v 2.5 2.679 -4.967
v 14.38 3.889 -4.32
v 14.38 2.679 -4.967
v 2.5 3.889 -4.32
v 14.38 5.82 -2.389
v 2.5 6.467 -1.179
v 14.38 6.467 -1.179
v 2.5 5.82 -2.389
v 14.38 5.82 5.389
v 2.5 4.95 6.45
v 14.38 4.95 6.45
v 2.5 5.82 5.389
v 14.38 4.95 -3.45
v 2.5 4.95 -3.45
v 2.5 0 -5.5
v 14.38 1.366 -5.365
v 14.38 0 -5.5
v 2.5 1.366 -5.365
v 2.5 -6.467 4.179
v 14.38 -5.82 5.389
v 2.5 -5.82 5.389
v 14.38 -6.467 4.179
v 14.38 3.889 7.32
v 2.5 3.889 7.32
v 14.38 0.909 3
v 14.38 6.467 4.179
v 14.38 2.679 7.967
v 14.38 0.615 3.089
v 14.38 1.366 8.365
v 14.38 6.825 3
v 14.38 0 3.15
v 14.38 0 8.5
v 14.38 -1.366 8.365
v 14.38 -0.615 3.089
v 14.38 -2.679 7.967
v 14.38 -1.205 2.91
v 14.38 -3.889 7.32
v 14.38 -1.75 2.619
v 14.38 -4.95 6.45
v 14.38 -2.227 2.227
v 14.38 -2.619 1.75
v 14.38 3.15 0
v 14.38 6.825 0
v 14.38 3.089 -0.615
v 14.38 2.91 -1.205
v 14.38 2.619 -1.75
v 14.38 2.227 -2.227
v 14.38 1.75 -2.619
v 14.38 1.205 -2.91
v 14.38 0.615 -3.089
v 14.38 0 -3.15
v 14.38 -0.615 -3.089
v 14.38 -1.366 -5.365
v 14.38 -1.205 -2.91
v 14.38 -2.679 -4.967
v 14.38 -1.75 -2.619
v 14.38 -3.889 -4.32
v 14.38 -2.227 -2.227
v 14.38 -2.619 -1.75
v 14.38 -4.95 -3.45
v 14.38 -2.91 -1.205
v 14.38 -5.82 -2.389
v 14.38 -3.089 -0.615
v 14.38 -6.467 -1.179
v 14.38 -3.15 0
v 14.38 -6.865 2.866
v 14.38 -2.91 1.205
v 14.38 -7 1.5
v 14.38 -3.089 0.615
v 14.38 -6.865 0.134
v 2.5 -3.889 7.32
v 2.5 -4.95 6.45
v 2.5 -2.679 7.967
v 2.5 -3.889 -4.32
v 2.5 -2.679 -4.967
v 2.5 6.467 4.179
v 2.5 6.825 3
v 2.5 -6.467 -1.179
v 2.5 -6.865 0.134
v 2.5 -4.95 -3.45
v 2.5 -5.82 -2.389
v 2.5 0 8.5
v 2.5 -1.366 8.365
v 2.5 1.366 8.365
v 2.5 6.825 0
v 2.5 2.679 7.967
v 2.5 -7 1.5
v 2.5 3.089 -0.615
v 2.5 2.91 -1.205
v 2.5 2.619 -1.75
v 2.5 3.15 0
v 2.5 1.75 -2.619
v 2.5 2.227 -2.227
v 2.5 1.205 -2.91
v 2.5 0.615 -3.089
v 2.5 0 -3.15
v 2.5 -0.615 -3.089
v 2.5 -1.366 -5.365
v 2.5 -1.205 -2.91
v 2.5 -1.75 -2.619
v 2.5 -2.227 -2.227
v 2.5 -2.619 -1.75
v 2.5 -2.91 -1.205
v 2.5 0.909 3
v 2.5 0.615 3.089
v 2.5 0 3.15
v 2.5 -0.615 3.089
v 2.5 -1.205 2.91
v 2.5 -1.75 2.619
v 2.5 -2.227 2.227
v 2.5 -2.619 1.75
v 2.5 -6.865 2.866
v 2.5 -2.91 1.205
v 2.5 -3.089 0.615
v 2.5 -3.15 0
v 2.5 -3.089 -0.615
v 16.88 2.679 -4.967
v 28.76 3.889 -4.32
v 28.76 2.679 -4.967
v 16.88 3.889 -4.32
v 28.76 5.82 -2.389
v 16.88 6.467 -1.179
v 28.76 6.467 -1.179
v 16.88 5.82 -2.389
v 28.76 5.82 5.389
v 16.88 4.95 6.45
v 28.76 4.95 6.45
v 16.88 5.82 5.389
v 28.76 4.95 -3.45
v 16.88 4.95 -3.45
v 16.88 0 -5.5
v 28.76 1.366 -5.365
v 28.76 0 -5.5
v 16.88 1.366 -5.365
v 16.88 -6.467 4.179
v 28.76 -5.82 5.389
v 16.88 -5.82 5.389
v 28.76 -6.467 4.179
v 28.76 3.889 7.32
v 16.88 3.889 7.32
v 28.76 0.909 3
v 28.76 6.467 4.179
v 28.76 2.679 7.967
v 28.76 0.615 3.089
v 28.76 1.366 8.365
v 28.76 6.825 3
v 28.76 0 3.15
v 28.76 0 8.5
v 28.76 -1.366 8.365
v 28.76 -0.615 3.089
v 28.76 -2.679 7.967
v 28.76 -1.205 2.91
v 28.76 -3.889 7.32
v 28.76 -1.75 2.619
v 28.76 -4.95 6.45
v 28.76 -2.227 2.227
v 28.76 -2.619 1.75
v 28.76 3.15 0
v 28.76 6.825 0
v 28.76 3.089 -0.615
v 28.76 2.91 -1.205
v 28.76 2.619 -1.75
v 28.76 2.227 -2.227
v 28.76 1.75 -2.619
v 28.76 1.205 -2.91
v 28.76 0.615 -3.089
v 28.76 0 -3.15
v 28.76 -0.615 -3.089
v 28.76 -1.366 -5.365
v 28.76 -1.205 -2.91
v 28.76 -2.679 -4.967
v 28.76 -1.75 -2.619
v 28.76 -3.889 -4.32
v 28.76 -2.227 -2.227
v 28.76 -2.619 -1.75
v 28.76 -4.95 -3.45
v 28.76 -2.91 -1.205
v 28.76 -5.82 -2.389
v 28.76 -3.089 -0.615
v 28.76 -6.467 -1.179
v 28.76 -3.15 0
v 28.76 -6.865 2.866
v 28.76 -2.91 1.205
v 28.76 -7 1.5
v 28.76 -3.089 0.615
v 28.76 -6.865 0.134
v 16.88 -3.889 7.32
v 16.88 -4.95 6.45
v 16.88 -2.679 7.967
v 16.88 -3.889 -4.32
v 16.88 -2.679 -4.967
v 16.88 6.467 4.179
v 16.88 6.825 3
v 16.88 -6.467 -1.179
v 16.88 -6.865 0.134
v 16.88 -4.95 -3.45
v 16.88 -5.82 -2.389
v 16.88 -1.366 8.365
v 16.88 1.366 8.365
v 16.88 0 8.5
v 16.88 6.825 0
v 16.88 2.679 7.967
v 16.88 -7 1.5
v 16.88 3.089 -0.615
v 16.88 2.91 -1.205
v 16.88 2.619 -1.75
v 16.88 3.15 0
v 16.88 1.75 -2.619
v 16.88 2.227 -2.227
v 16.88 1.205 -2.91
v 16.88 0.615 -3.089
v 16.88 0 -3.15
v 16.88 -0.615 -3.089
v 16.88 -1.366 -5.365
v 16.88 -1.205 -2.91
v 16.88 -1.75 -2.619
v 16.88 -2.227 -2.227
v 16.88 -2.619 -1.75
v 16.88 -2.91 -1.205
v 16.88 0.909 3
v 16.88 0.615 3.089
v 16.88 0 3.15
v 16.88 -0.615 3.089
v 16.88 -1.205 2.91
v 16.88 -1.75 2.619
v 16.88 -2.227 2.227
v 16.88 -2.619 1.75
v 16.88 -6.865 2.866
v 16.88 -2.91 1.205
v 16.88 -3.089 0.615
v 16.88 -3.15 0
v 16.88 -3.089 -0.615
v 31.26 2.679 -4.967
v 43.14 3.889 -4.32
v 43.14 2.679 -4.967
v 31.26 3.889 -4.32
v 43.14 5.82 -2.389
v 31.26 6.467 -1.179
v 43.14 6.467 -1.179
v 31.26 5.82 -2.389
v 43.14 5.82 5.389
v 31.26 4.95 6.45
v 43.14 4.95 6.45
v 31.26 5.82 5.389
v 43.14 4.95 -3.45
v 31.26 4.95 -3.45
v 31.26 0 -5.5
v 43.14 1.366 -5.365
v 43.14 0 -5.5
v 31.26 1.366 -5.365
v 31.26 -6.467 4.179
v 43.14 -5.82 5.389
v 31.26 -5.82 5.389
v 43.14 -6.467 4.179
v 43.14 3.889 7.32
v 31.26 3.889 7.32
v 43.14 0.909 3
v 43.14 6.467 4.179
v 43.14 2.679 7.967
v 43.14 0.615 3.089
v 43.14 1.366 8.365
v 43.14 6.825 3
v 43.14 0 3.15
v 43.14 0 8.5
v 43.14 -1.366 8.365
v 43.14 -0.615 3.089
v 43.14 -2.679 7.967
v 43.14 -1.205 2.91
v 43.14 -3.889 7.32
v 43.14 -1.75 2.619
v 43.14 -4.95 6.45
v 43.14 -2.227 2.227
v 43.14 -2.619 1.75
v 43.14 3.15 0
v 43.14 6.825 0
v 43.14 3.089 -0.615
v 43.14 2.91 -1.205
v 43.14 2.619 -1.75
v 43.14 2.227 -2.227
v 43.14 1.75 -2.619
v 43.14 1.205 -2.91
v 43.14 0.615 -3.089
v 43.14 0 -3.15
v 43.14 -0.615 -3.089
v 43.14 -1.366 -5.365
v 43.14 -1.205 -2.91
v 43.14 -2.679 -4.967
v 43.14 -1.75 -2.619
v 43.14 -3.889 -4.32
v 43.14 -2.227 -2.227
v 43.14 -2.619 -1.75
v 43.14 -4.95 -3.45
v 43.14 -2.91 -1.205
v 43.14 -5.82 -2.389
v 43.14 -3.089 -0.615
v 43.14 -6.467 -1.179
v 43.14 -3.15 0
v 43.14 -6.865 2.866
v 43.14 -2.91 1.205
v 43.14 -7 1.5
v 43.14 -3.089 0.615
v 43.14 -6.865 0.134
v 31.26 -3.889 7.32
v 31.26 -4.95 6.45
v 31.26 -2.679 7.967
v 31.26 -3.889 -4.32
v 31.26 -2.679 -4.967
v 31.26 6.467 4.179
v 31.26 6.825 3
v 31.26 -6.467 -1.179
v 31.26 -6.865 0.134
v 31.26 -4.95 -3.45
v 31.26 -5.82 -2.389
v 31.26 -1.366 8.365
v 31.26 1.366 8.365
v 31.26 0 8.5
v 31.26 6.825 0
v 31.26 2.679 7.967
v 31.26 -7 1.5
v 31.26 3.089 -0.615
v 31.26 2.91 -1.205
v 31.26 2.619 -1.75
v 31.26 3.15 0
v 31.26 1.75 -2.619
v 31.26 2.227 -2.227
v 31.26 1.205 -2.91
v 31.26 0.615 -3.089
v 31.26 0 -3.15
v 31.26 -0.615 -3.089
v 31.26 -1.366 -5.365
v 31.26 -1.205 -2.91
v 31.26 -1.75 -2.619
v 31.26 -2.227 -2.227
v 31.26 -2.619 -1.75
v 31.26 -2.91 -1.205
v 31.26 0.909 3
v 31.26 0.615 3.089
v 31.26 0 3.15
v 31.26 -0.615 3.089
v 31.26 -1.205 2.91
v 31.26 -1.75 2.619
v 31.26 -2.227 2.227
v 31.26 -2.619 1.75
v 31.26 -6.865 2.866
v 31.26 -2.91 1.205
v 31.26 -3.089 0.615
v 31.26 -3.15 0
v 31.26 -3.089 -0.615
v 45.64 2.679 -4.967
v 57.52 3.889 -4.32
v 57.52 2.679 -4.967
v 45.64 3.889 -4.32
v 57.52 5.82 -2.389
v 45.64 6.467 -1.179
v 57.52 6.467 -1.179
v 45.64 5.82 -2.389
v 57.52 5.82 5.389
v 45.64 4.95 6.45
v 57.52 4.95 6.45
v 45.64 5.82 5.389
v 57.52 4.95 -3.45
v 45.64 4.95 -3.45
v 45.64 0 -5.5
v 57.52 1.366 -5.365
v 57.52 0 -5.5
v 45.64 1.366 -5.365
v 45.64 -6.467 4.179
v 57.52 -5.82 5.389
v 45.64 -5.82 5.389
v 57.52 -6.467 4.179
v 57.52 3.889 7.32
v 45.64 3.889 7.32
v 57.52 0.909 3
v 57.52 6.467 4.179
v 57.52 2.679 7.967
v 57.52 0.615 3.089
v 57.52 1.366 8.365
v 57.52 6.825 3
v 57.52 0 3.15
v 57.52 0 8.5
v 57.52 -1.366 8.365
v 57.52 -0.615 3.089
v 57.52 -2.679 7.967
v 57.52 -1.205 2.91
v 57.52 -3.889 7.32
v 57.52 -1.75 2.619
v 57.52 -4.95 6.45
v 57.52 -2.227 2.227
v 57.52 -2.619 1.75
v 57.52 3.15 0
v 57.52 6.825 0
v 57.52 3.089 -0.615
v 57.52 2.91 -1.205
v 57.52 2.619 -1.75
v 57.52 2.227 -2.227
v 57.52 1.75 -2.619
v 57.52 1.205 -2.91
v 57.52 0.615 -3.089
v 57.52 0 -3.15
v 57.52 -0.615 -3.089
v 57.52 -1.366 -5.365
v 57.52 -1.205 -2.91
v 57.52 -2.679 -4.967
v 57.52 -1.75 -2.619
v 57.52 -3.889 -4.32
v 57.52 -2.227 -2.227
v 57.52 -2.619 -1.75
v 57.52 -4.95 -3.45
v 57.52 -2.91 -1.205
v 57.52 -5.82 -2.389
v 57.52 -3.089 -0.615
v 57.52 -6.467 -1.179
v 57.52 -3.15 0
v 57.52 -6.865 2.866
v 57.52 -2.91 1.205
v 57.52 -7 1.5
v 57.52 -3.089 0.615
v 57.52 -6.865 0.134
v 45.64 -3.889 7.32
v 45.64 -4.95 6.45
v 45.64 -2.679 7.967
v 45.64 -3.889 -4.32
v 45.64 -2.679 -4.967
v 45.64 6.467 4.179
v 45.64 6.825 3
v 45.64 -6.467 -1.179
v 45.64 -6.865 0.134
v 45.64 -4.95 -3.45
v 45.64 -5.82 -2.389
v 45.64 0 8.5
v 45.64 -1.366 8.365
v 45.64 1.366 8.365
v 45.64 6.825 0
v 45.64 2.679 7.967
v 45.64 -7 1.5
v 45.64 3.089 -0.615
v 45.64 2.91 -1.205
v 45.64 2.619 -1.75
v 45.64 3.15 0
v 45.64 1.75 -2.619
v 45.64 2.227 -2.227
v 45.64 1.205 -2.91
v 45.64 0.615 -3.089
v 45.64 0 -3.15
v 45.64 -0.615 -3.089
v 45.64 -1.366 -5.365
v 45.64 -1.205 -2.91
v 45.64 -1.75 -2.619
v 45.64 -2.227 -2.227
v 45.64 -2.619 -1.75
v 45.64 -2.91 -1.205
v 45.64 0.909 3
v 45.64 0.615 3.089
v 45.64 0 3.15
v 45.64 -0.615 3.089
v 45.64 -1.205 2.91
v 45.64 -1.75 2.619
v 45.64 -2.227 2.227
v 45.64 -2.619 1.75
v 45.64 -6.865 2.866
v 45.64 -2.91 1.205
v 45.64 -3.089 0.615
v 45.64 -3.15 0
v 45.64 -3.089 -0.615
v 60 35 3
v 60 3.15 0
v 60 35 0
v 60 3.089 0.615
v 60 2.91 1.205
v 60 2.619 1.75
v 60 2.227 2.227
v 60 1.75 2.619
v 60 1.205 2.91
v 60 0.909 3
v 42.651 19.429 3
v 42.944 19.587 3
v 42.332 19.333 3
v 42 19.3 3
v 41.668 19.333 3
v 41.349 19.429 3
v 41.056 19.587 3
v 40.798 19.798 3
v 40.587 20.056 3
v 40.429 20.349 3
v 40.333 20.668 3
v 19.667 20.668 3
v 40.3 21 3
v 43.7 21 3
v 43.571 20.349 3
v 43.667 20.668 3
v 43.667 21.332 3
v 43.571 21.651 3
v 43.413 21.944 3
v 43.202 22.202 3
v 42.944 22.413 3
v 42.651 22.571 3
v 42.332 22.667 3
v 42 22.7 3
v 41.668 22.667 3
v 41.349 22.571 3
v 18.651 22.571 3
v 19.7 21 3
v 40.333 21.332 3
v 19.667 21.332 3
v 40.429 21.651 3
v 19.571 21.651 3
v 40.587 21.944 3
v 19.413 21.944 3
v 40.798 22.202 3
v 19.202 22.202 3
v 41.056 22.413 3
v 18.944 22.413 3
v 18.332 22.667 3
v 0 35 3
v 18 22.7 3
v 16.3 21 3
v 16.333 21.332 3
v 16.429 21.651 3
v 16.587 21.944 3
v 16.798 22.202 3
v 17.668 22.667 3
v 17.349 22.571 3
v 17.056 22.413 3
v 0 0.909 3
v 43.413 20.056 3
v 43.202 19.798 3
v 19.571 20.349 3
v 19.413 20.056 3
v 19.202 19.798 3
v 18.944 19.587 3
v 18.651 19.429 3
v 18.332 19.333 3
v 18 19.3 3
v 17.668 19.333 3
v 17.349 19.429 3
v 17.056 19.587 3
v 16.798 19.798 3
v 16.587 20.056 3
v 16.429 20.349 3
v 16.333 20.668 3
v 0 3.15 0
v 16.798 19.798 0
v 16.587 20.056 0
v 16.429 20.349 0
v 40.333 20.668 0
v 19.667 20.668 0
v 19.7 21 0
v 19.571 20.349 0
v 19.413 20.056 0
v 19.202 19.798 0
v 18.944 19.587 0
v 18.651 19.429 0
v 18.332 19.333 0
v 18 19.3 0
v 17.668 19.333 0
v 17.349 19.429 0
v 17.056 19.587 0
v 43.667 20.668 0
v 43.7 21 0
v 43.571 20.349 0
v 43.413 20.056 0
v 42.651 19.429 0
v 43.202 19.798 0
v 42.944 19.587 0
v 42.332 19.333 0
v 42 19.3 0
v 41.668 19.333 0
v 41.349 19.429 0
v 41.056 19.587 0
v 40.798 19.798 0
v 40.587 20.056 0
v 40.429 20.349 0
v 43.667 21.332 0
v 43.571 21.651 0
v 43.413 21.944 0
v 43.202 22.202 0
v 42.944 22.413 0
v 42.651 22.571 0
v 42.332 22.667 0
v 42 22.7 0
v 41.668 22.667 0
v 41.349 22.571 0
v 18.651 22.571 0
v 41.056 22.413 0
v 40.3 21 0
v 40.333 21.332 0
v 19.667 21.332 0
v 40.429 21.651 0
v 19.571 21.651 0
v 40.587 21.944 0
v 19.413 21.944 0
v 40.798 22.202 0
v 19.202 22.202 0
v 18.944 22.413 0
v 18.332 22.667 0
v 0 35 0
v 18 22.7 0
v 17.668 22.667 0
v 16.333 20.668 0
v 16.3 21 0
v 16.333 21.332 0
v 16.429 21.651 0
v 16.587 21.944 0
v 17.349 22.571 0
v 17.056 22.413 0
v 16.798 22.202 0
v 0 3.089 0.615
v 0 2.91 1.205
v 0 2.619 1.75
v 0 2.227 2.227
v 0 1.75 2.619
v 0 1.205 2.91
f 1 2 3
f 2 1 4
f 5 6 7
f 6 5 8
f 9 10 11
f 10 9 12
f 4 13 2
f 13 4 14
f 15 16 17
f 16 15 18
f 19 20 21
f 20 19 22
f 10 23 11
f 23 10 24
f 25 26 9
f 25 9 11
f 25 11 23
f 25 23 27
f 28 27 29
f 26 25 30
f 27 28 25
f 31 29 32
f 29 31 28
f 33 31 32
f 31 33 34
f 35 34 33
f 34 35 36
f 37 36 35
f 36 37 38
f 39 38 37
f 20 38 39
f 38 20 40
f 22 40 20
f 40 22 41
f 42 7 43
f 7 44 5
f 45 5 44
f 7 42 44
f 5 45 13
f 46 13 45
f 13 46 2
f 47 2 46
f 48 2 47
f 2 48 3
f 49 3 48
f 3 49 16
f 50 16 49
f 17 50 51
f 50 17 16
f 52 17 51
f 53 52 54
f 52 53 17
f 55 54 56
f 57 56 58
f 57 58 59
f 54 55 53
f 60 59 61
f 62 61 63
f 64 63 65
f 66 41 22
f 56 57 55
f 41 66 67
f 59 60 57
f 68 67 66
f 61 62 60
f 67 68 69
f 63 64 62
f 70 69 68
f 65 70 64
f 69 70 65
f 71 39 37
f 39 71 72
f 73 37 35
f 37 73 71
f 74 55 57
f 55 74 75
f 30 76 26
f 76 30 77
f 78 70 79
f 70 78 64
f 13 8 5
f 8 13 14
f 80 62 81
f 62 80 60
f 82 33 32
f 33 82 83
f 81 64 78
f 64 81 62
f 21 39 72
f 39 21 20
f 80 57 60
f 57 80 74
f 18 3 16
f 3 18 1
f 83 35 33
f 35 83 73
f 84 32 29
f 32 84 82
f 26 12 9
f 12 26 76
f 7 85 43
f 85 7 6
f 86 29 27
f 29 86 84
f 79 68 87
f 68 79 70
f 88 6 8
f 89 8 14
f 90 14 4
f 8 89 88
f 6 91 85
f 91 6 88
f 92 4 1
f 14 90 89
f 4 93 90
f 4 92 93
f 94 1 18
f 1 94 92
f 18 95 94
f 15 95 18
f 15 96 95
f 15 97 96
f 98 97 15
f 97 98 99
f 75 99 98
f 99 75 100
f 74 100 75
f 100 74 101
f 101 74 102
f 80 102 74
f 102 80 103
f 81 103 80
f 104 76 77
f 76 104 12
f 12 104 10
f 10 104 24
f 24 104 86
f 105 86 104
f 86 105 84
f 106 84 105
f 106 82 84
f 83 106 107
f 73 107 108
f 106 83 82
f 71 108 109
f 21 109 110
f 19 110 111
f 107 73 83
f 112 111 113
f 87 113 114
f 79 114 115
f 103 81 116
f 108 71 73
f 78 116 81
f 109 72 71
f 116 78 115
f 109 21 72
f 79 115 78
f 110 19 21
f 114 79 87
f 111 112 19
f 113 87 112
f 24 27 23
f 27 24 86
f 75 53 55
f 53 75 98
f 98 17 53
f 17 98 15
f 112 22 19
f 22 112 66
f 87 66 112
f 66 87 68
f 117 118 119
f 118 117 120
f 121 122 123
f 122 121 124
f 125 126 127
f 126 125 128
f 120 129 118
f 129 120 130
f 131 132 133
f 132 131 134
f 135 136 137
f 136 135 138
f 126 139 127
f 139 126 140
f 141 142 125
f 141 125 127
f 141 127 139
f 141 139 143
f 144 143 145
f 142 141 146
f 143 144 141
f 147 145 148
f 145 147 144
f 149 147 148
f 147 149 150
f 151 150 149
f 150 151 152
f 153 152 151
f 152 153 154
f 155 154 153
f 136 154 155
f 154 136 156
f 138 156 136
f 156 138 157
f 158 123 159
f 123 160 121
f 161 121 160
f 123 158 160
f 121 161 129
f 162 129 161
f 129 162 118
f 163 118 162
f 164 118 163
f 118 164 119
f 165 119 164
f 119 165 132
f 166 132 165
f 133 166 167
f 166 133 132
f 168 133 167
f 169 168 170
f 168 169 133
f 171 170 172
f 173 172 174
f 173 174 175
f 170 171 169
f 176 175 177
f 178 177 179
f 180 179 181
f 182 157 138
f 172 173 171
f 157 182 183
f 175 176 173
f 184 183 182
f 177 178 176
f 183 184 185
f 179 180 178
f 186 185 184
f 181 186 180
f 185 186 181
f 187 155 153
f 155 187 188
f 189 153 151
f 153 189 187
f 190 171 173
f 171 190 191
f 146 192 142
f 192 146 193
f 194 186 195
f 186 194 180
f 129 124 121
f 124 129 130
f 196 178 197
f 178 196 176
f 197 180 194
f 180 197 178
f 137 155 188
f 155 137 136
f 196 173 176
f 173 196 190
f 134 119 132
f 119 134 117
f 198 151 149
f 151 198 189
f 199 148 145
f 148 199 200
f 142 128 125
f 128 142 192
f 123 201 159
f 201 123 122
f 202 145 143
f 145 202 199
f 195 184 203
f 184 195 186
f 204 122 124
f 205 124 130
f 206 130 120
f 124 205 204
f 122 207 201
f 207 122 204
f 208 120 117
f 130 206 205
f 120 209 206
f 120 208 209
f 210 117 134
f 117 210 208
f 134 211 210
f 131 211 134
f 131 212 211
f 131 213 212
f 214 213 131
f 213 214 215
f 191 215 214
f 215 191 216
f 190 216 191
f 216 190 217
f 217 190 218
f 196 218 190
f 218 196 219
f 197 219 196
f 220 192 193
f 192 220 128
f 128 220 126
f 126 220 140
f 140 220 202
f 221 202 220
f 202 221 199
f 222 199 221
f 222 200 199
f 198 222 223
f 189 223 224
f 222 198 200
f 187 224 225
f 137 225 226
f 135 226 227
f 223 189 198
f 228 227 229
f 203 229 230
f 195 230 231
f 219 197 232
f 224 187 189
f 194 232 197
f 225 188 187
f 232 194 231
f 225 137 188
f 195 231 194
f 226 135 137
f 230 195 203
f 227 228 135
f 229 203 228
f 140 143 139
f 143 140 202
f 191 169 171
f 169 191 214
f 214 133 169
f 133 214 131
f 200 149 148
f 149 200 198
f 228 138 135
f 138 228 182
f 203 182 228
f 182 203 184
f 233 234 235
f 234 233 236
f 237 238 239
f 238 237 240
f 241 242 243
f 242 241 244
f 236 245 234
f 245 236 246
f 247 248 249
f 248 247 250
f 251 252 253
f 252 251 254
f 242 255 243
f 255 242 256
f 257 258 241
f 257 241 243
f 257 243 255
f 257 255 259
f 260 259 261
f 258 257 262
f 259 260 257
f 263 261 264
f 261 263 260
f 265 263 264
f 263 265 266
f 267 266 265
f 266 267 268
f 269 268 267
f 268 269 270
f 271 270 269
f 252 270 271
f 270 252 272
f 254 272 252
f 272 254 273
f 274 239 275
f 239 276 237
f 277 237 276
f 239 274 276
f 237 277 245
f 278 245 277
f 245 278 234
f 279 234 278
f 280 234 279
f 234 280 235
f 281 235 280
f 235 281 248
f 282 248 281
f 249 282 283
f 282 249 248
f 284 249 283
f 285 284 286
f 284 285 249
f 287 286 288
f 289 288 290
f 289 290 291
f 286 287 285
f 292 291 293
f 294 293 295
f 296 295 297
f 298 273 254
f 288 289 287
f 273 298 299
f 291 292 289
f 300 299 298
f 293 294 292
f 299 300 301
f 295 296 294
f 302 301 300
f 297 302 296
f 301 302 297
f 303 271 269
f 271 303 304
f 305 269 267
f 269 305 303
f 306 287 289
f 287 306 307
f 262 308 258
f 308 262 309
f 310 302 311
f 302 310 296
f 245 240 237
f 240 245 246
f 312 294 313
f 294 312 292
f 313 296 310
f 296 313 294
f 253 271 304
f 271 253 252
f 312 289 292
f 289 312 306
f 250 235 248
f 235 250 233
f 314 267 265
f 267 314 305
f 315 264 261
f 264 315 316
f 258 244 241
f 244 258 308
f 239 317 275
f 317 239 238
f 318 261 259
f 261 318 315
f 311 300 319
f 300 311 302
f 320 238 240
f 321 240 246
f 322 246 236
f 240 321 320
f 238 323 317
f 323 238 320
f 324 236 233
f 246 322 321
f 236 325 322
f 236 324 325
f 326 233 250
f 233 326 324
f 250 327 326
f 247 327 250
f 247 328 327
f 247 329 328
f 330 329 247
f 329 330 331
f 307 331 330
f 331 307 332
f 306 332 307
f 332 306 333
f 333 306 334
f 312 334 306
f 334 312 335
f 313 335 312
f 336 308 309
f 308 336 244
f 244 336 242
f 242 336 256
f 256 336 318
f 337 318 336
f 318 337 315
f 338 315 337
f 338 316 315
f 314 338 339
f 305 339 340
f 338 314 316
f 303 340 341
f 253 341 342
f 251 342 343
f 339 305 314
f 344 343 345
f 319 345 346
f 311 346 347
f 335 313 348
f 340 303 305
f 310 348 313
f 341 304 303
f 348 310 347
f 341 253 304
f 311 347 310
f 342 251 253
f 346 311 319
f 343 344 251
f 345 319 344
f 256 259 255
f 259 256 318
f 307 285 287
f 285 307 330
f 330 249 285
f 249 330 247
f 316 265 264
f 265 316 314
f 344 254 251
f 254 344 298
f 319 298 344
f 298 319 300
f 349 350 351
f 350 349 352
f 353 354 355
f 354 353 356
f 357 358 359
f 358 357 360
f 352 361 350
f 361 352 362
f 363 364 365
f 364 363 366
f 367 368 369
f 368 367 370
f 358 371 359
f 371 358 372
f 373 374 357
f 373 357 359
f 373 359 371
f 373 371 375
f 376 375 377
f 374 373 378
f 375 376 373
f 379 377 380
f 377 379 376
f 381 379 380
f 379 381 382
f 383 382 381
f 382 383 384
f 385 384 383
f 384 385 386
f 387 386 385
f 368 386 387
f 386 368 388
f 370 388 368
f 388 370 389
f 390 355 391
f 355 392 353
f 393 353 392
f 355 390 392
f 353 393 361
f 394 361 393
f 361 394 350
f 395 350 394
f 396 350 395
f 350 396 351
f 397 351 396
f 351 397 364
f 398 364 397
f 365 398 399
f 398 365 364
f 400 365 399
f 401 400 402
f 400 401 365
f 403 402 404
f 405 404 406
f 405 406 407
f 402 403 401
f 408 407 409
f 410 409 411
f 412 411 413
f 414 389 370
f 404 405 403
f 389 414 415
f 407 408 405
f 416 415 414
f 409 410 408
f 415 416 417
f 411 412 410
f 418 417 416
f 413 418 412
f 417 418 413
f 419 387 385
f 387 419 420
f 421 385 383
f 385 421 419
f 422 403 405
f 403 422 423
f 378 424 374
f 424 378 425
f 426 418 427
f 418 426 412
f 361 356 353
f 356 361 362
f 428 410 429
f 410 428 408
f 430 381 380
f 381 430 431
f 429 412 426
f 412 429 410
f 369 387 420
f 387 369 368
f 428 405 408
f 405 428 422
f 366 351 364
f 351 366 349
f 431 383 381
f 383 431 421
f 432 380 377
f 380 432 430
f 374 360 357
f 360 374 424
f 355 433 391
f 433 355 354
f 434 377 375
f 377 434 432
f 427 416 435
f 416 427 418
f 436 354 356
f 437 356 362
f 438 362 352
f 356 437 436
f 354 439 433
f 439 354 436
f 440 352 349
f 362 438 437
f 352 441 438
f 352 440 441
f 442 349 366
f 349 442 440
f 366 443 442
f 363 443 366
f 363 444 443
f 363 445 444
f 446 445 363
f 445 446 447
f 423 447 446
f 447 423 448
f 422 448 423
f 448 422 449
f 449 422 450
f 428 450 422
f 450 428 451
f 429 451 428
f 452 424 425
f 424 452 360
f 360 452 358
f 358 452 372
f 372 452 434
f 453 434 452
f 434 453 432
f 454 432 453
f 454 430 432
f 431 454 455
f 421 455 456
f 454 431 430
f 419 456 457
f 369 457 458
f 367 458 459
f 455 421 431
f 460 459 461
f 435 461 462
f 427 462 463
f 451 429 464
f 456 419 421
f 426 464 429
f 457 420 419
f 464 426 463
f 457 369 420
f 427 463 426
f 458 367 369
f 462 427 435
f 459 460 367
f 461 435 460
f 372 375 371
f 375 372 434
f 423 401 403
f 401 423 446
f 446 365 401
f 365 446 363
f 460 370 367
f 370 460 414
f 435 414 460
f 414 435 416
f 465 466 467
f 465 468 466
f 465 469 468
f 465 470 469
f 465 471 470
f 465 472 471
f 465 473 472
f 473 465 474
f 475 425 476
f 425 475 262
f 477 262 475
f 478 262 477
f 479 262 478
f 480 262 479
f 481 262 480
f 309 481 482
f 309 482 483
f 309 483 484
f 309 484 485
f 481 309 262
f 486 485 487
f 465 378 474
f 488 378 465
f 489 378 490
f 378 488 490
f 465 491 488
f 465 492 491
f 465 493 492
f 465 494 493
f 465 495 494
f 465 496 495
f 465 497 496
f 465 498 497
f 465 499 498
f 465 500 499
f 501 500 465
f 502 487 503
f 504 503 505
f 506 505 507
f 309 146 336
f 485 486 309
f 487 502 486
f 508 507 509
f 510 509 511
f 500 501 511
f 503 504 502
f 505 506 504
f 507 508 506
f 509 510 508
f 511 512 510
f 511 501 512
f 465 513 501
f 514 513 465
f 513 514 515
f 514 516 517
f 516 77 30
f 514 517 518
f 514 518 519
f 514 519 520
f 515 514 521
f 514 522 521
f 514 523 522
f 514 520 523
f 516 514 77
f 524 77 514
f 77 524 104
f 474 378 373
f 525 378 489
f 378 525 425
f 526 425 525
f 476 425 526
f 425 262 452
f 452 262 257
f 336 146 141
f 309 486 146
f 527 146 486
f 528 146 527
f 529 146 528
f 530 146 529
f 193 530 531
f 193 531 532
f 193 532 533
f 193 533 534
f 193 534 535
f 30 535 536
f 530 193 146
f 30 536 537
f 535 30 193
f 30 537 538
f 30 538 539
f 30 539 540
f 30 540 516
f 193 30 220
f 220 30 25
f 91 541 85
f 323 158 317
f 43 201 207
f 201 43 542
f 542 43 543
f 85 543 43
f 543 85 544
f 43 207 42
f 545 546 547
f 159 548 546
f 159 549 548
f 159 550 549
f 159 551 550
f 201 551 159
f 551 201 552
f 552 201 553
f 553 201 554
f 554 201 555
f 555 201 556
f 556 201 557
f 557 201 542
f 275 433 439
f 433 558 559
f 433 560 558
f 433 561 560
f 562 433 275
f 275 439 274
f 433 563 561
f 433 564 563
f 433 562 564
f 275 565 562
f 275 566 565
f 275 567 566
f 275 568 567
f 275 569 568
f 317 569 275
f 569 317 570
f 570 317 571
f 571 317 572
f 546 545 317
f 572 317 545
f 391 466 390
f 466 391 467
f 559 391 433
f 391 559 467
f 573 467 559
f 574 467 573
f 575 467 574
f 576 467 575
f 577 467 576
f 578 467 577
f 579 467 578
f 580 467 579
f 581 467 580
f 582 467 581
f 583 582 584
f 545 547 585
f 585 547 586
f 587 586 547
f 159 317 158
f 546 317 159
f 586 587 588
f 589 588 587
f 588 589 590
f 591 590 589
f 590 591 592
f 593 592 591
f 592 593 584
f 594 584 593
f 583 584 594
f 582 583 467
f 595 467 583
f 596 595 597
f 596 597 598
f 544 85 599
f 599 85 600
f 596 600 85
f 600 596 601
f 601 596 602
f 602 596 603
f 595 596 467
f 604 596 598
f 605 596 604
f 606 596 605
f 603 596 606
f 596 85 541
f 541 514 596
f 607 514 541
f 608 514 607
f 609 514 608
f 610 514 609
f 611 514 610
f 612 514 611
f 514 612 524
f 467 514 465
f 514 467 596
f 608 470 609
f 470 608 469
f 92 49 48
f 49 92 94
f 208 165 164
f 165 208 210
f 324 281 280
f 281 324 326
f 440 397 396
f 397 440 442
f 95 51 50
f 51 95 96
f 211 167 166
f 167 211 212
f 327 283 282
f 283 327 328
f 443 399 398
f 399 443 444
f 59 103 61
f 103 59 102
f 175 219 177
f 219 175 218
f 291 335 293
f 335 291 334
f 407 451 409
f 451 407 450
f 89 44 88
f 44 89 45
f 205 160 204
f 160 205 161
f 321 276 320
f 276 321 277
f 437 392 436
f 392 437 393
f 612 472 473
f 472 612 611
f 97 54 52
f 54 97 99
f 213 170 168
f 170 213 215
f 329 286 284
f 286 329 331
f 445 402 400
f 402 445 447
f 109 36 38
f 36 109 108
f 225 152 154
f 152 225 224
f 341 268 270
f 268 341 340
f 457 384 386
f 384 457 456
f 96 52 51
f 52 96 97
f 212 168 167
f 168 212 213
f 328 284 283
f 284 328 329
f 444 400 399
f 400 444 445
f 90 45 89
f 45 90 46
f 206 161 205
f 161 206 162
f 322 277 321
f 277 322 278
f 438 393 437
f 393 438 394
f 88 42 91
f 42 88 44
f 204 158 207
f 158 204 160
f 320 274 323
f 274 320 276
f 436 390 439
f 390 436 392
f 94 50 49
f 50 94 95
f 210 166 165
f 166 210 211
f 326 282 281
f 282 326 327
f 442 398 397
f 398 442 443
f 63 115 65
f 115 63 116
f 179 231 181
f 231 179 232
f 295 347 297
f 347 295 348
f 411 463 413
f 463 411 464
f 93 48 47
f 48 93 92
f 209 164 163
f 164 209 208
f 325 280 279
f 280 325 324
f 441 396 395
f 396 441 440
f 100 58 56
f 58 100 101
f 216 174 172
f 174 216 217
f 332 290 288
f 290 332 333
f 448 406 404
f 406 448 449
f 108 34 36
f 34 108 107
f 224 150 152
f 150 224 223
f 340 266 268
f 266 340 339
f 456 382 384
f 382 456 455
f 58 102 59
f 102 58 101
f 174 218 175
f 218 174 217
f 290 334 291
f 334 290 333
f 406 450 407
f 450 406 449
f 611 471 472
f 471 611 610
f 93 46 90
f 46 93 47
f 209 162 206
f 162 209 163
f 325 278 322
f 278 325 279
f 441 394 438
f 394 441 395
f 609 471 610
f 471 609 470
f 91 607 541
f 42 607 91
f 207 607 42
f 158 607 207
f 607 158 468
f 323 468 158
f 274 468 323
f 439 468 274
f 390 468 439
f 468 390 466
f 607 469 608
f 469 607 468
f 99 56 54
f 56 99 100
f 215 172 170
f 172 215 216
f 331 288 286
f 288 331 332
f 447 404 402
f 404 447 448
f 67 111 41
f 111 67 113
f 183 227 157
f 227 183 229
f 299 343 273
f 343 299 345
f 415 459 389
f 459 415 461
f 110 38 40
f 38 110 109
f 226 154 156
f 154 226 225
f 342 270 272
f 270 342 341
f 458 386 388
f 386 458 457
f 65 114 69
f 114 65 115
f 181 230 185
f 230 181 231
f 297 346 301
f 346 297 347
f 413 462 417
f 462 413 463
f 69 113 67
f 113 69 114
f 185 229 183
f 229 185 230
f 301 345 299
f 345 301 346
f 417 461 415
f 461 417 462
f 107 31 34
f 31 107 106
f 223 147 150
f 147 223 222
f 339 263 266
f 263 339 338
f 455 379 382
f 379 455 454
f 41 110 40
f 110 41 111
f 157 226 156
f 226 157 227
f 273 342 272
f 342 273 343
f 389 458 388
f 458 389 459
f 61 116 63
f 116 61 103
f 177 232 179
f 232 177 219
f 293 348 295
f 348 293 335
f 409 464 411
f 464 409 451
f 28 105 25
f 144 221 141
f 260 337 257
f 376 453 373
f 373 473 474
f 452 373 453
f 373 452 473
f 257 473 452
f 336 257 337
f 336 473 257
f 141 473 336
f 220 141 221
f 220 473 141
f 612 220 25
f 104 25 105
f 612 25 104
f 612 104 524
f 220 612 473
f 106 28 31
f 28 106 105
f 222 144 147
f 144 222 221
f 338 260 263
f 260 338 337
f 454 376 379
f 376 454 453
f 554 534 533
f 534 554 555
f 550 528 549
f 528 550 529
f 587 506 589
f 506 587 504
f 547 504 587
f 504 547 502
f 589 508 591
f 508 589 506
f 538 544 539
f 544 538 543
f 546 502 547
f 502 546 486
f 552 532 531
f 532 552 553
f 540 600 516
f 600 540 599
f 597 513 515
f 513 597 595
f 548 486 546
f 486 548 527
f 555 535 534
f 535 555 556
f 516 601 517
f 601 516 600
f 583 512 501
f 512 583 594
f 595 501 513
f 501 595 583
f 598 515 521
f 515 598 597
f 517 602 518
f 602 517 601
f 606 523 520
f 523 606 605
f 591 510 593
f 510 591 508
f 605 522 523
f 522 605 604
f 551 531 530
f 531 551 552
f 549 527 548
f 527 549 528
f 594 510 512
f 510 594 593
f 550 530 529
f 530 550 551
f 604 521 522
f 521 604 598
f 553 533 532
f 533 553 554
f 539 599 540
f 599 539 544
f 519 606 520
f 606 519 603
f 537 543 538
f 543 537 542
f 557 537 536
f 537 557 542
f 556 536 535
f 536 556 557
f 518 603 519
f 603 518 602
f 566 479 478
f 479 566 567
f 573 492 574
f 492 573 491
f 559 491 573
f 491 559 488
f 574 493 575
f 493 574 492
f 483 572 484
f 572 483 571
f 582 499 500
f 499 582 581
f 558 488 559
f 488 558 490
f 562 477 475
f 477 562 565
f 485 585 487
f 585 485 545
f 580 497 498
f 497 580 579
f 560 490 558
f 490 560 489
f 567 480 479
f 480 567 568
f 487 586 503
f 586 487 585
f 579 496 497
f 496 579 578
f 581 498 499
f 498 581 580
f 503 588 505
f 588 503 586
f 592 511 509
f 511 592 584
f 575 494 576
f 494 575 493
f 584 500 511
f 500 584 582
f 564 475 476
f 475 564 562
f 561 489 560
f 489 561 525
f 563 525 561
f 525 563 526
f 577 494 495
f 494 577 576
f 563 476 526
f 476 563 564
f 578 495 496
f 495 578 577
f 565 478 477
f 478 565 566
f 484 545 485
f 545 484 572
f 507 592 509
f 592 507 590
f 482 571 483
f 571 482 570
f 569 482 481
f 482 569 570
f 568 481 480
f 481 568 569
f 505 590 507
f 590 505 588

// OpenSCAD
$fn = 32;

// ----------------------------------------------------------------------
// Hinge leaf: 60 x 42 x 14 mm
// ----------------------------------------------------------------------

// --- parameters (mm) ---
tab_len = 60;             // leaf length, X
tab_w = 35;               // leaf width, Y
tab_t = 3;                // leaf thickness
ring_d = 14;              // knuckle diameter
ring_w = 11.88;           // knuckle width
knuckle_n = 4;            // number of knuckles
pin_d = 6.3;              // pin bore
gap = 2.5;                // gap between the knuckles
screw_d = 3.4;            // screw clearance

module leaf() {
  cube([tab_len, tab_w, tab_t]);
}

module knuckles() {
  /* barrels sit on the leaf edge, the pin axis at half the leaf thickness */
  for (i = [0 : knuckle_n - 1])
    translate([gap + i * (ring_w + gap), 0, tab_t * 0.5])
      rotate([0, 90, 0]) cylinder(h = ring_w, d = ring_d);
}

difference() {
  union() {
    leaf();
    knuckles();
  }
  rotate([0, 90, 0]) translate([0, 0, -1])
    cylinder(h = tab_len + 2, d = pin_d);
  translate([18, tab_w * 0.6, -1]) cylinder(h = tab_t + 2, d = screw_d);
  translate([42, tab_w * 0.6, -1]) cylinder(h = tab_t + 2, d = screw_d);
}
